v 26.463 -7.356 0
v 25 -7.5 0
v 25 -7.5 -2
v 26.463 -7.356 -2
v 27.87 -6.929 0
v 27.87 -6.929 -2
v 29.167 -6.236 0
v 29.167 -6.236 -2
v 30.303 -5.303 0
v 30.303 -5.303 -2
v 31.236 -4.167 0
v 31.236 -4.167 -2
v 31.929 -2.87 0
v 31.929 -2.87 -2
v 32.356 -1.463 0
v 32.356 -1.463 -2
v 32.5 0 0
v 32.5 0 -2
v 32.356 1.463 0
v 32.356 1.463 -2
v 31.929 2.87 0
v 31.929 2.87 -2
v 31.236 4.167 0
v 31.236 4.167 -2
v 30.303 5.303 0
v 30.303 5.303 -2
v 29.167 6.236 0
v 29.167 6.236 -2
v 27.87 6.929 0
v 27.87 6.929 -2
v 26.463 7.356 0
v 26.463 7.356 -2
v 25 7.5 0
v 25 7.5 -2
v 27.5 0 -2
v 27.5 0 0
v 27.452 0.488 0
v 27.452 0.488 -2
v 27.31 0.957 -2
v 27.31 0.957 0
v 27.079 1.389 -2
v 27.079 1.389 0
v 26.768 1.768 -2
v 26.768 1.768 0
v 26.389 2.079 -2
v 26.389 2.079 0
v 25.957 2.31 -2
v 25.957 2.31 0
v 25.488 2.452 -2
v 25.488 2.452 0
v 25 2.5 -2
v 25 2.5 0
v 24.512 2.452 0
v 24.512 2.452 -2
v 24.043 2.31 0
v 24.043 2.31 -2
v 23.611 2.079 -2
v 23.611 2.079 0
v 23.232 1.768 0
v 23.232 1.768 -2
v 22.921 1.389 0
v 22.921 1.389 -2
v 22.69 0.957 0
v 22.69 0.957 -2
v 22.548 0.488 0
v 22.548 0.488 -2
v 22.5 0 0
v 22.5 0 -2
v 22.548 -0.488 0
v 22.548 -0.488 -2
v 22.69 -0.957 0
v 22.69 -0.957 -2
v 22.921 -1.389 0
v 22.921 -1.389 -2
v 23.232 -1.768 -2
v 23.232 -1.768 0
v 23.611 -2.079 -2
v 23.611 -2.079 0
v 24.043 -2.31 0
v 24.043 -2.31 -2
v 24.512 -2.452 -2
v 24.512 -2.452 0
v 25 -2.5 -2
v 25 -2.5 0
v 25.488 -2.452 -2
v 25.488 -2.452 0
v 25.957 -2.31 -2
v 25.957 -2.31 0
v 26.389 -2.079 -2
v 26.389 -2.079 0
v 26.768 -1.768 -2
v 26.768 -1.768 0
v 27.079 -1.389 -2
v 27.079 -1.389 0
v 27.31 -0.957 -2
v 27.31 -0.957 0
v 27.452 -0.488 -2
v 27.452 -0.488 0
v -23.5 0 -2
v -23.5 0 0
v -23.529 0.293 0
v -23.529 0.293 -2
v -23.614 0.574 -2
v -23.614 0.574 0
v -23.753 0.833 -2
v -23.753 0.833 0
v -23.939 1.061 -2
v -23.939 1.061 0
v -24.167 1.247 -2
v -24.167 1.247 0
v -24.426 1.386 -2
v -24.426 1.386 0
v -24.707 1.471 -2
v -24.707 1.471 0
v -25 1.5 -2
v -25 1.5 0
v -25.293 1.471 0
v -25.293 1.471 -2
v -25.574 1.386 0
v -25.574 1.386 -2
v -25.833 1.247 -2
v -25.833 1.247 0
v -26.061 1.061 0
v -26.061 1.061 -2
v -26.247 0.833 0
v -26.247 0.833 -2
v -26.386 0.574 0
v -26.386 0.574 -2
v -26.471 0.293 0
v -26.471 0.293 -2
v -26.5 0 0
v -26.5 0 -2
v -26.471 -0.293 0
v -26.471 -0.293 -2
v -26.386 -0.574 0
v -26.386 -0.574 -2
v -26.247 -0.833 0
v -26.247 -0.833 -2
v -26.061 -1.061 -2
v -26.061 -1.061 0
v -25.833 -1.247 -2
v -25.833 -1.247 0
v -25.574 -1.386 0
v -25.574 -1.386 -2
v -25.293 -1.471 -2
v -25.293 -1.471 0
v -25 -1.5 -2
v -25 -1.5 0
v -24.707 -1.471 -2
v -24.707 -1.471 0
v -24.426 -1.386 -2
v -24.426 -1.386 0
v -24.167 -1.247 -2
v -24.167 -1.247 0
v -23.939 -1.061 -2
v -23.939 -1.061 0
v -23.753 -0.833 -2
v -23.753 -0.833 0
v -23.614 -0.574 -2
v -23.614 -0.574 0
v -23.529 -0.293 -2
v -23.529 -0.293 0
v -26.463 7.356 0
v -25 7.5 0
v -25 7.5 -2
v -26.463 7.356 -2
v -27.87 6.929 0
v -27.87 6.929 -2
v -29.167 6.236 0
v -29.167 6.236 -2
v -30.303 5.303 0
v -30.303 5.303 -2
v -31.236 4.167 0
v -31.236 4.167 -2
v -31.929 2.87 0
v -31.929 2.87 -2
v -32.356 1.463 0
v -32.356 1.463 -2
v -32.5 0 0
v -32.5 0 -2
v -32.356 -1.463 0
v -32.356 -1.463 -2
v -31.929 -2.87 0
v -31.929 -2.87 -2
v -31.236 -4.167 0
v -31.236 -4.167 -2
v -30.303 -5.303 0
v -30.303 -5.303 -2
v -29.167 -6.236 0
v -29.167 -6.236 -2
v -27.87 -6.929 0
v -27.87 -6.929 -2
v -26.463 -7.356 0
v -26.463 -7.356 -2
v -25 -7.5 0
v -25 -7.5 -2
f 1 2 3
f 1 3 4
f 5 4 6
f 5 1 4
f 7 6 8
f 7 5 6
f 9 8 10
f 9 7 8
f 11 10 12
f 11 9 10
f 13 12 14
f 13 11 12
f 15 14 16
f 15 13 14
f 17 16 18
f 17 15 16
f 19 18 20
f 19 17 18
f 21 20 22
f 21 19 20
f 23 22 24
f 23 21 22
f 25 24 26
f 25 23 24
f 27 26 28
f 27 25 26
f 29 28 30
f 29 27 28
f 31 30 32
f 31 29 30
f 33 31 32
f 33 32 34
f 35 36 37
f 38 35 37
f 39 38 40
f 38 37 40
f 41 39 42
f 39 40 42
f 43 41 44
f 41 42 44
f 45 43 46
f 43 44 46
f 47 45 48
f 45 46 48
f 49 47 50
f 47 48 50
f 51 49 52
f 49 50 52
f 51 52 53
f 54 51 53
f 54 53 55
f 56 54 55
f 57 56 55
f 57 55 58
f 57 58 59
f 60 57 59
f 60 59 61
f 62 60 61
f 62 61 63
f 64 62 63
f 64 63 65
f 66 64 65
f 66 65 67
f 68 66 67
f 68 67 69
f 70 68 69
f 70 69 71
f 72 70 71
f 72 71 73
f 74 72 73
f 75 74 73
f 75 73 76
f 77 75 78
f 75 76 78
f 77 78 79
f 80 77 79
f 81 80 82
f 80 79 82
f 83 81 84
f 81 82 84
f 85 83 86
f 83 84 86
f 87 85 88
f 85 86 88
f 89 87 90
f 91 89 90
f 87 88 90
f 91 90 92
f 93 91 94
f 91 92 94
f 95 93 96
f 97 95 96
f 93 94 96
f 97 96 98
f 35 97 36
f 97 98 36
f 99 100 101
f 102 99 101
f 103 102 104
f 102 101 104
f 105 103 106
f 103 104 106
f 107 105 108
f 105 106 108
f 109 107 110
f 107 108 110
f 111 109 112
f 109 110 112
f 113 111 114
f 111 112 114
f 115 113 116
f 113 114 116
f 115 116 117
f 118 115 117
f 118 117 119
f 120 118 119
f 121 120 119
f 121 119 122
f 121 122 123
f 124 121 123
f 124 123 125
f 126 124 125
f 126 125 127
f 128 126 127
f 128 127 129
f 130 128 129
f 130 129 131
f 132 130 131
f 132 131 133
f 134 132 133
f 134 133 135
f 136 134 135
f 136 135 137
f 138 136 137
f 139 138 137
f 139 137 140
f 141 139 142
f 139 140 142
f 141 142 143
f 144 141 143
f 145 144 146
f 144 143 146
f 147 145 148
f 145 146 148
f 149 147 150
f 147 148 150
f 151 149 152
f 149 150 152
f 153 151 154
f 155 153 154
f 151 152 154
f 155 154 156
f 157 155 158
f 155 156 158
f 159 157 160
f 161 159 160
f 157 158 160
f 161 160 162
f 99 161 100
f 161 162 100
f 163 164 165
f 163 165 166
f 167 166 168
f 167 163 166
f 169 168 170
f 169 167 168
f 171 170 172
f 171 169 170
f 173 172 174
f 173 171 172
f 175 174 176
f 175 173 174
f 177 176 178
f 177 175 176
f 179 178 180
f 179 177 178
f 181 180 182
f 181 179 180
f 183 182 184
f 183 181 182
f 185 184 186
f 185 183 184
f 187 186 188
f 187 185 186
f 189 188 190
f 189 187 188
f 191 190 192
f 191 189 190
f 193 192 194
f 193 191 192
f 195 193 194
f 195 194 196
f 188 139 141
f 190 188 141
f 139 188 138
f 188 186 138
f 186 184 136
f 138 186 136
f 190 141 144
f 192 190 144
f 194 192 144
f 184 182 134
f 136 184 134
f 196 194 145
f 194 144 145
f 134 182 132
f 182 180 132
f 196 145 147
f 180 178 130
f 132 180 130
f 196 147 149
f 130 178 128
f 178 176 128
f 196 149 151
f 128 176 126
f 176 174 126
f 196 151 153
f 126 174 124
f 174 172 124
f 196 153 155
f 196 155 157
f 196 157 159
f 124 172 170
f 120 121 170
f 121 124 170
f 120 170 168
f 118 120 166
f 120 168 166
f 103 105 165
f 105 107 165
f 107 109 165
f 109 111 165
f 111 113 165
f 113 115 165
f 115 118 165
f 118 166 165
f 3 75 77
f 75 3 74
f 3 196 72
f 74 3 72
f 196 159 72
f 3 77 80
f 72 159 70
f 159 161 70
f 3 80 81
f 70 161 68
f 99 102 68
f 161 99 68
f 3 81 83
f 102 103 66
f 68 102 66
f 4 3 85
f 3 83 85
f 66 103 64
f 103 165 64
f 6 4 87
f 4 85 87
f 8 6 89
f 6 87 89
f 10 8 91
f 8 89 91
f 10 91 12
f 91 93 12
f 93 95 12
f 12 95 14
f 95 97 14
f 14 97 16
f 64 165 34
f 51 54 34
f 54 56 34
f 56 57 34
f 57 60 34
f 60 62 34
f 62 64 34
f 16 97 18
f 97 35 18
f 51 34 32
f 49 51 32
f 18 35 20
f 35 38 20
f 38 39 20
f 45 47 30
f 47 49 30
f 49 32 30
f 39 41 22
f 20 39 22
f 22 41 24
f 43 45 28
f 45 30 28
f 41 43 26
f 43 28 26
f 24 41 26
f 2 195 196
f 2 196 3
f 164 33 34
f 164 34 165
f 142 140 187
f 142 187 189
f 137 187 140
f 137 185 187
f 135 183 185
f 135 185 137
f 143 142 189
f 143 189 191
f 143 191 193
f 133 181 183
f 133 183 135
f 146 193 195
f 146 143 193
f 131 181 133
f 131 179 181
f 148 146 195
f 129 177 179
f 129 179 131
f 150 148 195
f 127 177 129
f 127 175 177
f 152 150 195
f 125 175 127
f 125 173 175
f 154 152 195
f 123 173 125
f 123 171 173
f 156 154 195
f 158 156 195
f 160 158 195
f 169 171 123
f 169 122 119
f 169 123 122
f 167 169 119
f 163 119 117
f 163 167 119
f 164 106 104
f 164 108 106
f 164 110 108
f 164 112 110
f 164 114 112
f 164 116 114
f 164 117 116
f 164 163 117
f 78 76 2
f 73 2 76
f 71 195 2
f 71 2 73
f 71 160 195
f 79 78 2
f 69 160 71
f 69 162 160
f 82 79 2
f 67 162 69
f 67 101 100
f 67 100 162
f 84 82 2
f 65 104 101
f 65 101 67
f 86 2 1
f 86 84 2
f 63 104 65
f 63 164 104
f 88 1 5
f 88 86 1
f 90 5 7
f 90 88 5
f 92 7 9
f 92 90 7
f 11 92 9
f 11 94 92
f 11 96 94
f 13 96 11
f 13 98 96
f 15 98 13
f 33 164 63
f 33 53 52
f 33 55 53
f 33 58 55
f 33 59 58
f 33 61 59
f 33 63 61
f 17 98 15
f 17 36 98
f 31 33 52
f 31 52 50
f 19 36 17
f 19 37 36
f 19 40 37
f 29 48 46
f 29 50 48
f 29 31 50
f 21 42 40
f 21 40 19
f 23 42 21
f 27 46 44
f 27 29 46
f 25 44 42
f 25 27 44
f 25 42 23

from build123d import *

# Parameters (mm, degrees)
BOSS_EXTRUDE1_DEPTH = 2
CUT_EXTRUDE1_REACH  = 4
SKETCH2_R           = 1.5
SKETCH2_R_2         = 2.5


with BuildPart() as part:
    # Sketch1 → Boss-Extrude1 (new body)
    with BuildSketch(Plane.XY):
        with BuildLine():
            Line((-25, -7.5), (25, -7.5))
            ThreePointArc((25, -7.5), (32.5, 0), (25, 7.5))
            Line((25, 7.5), (-25, 7.5))
            ThreePointArc((-25, 7.5), (-32.5, 0), (-25, -7.5))
        make_face()
    extrude(amount=-BOSS_EXTRUDE1_DEPTH)

    # Sketch2 → Cut-Extrude1 (cut, up to next)
    with BuildSketch(Plane.XY, mode=Mode.PRIVATE) as cut_extrude1_sk1:
        with Locations((-25, 0)):
            Circle(SKETCH2_R)
    cut_extrude1_tool1 = extrude(cut_extrude1_sk1.sketch, amount=-CUT_EXTRUDE1_REACH, mode=Mode.PRIVATE) & part.part
    add(cut_extrude1_tool1.solids().sort_by_distance((-25, 0, 0))[0], mode=Mode.SUBTRACT)
    # Sketch2 → Cut-Extrude1 (cut, up to next)
    with BuildSketch(Plane.XY, mode=Mode.PRIVATE) as cut_extrude1_sk2:
        with Locations((25, 0)):
            Circle(SKETCH2_R_2)
    cut_extrude1_tool2 = extrude(cut_extrude1_sk2.sketch, amount=-CUT_EXTRUDE1_REACH, mode=Mode.PRIVATE) & part.part
    add(cut_extrude1_tool2.solids().sort_by_distance((25, 0, 0))[0], mode=Mode.SUBTRACT)


solid = part.part
